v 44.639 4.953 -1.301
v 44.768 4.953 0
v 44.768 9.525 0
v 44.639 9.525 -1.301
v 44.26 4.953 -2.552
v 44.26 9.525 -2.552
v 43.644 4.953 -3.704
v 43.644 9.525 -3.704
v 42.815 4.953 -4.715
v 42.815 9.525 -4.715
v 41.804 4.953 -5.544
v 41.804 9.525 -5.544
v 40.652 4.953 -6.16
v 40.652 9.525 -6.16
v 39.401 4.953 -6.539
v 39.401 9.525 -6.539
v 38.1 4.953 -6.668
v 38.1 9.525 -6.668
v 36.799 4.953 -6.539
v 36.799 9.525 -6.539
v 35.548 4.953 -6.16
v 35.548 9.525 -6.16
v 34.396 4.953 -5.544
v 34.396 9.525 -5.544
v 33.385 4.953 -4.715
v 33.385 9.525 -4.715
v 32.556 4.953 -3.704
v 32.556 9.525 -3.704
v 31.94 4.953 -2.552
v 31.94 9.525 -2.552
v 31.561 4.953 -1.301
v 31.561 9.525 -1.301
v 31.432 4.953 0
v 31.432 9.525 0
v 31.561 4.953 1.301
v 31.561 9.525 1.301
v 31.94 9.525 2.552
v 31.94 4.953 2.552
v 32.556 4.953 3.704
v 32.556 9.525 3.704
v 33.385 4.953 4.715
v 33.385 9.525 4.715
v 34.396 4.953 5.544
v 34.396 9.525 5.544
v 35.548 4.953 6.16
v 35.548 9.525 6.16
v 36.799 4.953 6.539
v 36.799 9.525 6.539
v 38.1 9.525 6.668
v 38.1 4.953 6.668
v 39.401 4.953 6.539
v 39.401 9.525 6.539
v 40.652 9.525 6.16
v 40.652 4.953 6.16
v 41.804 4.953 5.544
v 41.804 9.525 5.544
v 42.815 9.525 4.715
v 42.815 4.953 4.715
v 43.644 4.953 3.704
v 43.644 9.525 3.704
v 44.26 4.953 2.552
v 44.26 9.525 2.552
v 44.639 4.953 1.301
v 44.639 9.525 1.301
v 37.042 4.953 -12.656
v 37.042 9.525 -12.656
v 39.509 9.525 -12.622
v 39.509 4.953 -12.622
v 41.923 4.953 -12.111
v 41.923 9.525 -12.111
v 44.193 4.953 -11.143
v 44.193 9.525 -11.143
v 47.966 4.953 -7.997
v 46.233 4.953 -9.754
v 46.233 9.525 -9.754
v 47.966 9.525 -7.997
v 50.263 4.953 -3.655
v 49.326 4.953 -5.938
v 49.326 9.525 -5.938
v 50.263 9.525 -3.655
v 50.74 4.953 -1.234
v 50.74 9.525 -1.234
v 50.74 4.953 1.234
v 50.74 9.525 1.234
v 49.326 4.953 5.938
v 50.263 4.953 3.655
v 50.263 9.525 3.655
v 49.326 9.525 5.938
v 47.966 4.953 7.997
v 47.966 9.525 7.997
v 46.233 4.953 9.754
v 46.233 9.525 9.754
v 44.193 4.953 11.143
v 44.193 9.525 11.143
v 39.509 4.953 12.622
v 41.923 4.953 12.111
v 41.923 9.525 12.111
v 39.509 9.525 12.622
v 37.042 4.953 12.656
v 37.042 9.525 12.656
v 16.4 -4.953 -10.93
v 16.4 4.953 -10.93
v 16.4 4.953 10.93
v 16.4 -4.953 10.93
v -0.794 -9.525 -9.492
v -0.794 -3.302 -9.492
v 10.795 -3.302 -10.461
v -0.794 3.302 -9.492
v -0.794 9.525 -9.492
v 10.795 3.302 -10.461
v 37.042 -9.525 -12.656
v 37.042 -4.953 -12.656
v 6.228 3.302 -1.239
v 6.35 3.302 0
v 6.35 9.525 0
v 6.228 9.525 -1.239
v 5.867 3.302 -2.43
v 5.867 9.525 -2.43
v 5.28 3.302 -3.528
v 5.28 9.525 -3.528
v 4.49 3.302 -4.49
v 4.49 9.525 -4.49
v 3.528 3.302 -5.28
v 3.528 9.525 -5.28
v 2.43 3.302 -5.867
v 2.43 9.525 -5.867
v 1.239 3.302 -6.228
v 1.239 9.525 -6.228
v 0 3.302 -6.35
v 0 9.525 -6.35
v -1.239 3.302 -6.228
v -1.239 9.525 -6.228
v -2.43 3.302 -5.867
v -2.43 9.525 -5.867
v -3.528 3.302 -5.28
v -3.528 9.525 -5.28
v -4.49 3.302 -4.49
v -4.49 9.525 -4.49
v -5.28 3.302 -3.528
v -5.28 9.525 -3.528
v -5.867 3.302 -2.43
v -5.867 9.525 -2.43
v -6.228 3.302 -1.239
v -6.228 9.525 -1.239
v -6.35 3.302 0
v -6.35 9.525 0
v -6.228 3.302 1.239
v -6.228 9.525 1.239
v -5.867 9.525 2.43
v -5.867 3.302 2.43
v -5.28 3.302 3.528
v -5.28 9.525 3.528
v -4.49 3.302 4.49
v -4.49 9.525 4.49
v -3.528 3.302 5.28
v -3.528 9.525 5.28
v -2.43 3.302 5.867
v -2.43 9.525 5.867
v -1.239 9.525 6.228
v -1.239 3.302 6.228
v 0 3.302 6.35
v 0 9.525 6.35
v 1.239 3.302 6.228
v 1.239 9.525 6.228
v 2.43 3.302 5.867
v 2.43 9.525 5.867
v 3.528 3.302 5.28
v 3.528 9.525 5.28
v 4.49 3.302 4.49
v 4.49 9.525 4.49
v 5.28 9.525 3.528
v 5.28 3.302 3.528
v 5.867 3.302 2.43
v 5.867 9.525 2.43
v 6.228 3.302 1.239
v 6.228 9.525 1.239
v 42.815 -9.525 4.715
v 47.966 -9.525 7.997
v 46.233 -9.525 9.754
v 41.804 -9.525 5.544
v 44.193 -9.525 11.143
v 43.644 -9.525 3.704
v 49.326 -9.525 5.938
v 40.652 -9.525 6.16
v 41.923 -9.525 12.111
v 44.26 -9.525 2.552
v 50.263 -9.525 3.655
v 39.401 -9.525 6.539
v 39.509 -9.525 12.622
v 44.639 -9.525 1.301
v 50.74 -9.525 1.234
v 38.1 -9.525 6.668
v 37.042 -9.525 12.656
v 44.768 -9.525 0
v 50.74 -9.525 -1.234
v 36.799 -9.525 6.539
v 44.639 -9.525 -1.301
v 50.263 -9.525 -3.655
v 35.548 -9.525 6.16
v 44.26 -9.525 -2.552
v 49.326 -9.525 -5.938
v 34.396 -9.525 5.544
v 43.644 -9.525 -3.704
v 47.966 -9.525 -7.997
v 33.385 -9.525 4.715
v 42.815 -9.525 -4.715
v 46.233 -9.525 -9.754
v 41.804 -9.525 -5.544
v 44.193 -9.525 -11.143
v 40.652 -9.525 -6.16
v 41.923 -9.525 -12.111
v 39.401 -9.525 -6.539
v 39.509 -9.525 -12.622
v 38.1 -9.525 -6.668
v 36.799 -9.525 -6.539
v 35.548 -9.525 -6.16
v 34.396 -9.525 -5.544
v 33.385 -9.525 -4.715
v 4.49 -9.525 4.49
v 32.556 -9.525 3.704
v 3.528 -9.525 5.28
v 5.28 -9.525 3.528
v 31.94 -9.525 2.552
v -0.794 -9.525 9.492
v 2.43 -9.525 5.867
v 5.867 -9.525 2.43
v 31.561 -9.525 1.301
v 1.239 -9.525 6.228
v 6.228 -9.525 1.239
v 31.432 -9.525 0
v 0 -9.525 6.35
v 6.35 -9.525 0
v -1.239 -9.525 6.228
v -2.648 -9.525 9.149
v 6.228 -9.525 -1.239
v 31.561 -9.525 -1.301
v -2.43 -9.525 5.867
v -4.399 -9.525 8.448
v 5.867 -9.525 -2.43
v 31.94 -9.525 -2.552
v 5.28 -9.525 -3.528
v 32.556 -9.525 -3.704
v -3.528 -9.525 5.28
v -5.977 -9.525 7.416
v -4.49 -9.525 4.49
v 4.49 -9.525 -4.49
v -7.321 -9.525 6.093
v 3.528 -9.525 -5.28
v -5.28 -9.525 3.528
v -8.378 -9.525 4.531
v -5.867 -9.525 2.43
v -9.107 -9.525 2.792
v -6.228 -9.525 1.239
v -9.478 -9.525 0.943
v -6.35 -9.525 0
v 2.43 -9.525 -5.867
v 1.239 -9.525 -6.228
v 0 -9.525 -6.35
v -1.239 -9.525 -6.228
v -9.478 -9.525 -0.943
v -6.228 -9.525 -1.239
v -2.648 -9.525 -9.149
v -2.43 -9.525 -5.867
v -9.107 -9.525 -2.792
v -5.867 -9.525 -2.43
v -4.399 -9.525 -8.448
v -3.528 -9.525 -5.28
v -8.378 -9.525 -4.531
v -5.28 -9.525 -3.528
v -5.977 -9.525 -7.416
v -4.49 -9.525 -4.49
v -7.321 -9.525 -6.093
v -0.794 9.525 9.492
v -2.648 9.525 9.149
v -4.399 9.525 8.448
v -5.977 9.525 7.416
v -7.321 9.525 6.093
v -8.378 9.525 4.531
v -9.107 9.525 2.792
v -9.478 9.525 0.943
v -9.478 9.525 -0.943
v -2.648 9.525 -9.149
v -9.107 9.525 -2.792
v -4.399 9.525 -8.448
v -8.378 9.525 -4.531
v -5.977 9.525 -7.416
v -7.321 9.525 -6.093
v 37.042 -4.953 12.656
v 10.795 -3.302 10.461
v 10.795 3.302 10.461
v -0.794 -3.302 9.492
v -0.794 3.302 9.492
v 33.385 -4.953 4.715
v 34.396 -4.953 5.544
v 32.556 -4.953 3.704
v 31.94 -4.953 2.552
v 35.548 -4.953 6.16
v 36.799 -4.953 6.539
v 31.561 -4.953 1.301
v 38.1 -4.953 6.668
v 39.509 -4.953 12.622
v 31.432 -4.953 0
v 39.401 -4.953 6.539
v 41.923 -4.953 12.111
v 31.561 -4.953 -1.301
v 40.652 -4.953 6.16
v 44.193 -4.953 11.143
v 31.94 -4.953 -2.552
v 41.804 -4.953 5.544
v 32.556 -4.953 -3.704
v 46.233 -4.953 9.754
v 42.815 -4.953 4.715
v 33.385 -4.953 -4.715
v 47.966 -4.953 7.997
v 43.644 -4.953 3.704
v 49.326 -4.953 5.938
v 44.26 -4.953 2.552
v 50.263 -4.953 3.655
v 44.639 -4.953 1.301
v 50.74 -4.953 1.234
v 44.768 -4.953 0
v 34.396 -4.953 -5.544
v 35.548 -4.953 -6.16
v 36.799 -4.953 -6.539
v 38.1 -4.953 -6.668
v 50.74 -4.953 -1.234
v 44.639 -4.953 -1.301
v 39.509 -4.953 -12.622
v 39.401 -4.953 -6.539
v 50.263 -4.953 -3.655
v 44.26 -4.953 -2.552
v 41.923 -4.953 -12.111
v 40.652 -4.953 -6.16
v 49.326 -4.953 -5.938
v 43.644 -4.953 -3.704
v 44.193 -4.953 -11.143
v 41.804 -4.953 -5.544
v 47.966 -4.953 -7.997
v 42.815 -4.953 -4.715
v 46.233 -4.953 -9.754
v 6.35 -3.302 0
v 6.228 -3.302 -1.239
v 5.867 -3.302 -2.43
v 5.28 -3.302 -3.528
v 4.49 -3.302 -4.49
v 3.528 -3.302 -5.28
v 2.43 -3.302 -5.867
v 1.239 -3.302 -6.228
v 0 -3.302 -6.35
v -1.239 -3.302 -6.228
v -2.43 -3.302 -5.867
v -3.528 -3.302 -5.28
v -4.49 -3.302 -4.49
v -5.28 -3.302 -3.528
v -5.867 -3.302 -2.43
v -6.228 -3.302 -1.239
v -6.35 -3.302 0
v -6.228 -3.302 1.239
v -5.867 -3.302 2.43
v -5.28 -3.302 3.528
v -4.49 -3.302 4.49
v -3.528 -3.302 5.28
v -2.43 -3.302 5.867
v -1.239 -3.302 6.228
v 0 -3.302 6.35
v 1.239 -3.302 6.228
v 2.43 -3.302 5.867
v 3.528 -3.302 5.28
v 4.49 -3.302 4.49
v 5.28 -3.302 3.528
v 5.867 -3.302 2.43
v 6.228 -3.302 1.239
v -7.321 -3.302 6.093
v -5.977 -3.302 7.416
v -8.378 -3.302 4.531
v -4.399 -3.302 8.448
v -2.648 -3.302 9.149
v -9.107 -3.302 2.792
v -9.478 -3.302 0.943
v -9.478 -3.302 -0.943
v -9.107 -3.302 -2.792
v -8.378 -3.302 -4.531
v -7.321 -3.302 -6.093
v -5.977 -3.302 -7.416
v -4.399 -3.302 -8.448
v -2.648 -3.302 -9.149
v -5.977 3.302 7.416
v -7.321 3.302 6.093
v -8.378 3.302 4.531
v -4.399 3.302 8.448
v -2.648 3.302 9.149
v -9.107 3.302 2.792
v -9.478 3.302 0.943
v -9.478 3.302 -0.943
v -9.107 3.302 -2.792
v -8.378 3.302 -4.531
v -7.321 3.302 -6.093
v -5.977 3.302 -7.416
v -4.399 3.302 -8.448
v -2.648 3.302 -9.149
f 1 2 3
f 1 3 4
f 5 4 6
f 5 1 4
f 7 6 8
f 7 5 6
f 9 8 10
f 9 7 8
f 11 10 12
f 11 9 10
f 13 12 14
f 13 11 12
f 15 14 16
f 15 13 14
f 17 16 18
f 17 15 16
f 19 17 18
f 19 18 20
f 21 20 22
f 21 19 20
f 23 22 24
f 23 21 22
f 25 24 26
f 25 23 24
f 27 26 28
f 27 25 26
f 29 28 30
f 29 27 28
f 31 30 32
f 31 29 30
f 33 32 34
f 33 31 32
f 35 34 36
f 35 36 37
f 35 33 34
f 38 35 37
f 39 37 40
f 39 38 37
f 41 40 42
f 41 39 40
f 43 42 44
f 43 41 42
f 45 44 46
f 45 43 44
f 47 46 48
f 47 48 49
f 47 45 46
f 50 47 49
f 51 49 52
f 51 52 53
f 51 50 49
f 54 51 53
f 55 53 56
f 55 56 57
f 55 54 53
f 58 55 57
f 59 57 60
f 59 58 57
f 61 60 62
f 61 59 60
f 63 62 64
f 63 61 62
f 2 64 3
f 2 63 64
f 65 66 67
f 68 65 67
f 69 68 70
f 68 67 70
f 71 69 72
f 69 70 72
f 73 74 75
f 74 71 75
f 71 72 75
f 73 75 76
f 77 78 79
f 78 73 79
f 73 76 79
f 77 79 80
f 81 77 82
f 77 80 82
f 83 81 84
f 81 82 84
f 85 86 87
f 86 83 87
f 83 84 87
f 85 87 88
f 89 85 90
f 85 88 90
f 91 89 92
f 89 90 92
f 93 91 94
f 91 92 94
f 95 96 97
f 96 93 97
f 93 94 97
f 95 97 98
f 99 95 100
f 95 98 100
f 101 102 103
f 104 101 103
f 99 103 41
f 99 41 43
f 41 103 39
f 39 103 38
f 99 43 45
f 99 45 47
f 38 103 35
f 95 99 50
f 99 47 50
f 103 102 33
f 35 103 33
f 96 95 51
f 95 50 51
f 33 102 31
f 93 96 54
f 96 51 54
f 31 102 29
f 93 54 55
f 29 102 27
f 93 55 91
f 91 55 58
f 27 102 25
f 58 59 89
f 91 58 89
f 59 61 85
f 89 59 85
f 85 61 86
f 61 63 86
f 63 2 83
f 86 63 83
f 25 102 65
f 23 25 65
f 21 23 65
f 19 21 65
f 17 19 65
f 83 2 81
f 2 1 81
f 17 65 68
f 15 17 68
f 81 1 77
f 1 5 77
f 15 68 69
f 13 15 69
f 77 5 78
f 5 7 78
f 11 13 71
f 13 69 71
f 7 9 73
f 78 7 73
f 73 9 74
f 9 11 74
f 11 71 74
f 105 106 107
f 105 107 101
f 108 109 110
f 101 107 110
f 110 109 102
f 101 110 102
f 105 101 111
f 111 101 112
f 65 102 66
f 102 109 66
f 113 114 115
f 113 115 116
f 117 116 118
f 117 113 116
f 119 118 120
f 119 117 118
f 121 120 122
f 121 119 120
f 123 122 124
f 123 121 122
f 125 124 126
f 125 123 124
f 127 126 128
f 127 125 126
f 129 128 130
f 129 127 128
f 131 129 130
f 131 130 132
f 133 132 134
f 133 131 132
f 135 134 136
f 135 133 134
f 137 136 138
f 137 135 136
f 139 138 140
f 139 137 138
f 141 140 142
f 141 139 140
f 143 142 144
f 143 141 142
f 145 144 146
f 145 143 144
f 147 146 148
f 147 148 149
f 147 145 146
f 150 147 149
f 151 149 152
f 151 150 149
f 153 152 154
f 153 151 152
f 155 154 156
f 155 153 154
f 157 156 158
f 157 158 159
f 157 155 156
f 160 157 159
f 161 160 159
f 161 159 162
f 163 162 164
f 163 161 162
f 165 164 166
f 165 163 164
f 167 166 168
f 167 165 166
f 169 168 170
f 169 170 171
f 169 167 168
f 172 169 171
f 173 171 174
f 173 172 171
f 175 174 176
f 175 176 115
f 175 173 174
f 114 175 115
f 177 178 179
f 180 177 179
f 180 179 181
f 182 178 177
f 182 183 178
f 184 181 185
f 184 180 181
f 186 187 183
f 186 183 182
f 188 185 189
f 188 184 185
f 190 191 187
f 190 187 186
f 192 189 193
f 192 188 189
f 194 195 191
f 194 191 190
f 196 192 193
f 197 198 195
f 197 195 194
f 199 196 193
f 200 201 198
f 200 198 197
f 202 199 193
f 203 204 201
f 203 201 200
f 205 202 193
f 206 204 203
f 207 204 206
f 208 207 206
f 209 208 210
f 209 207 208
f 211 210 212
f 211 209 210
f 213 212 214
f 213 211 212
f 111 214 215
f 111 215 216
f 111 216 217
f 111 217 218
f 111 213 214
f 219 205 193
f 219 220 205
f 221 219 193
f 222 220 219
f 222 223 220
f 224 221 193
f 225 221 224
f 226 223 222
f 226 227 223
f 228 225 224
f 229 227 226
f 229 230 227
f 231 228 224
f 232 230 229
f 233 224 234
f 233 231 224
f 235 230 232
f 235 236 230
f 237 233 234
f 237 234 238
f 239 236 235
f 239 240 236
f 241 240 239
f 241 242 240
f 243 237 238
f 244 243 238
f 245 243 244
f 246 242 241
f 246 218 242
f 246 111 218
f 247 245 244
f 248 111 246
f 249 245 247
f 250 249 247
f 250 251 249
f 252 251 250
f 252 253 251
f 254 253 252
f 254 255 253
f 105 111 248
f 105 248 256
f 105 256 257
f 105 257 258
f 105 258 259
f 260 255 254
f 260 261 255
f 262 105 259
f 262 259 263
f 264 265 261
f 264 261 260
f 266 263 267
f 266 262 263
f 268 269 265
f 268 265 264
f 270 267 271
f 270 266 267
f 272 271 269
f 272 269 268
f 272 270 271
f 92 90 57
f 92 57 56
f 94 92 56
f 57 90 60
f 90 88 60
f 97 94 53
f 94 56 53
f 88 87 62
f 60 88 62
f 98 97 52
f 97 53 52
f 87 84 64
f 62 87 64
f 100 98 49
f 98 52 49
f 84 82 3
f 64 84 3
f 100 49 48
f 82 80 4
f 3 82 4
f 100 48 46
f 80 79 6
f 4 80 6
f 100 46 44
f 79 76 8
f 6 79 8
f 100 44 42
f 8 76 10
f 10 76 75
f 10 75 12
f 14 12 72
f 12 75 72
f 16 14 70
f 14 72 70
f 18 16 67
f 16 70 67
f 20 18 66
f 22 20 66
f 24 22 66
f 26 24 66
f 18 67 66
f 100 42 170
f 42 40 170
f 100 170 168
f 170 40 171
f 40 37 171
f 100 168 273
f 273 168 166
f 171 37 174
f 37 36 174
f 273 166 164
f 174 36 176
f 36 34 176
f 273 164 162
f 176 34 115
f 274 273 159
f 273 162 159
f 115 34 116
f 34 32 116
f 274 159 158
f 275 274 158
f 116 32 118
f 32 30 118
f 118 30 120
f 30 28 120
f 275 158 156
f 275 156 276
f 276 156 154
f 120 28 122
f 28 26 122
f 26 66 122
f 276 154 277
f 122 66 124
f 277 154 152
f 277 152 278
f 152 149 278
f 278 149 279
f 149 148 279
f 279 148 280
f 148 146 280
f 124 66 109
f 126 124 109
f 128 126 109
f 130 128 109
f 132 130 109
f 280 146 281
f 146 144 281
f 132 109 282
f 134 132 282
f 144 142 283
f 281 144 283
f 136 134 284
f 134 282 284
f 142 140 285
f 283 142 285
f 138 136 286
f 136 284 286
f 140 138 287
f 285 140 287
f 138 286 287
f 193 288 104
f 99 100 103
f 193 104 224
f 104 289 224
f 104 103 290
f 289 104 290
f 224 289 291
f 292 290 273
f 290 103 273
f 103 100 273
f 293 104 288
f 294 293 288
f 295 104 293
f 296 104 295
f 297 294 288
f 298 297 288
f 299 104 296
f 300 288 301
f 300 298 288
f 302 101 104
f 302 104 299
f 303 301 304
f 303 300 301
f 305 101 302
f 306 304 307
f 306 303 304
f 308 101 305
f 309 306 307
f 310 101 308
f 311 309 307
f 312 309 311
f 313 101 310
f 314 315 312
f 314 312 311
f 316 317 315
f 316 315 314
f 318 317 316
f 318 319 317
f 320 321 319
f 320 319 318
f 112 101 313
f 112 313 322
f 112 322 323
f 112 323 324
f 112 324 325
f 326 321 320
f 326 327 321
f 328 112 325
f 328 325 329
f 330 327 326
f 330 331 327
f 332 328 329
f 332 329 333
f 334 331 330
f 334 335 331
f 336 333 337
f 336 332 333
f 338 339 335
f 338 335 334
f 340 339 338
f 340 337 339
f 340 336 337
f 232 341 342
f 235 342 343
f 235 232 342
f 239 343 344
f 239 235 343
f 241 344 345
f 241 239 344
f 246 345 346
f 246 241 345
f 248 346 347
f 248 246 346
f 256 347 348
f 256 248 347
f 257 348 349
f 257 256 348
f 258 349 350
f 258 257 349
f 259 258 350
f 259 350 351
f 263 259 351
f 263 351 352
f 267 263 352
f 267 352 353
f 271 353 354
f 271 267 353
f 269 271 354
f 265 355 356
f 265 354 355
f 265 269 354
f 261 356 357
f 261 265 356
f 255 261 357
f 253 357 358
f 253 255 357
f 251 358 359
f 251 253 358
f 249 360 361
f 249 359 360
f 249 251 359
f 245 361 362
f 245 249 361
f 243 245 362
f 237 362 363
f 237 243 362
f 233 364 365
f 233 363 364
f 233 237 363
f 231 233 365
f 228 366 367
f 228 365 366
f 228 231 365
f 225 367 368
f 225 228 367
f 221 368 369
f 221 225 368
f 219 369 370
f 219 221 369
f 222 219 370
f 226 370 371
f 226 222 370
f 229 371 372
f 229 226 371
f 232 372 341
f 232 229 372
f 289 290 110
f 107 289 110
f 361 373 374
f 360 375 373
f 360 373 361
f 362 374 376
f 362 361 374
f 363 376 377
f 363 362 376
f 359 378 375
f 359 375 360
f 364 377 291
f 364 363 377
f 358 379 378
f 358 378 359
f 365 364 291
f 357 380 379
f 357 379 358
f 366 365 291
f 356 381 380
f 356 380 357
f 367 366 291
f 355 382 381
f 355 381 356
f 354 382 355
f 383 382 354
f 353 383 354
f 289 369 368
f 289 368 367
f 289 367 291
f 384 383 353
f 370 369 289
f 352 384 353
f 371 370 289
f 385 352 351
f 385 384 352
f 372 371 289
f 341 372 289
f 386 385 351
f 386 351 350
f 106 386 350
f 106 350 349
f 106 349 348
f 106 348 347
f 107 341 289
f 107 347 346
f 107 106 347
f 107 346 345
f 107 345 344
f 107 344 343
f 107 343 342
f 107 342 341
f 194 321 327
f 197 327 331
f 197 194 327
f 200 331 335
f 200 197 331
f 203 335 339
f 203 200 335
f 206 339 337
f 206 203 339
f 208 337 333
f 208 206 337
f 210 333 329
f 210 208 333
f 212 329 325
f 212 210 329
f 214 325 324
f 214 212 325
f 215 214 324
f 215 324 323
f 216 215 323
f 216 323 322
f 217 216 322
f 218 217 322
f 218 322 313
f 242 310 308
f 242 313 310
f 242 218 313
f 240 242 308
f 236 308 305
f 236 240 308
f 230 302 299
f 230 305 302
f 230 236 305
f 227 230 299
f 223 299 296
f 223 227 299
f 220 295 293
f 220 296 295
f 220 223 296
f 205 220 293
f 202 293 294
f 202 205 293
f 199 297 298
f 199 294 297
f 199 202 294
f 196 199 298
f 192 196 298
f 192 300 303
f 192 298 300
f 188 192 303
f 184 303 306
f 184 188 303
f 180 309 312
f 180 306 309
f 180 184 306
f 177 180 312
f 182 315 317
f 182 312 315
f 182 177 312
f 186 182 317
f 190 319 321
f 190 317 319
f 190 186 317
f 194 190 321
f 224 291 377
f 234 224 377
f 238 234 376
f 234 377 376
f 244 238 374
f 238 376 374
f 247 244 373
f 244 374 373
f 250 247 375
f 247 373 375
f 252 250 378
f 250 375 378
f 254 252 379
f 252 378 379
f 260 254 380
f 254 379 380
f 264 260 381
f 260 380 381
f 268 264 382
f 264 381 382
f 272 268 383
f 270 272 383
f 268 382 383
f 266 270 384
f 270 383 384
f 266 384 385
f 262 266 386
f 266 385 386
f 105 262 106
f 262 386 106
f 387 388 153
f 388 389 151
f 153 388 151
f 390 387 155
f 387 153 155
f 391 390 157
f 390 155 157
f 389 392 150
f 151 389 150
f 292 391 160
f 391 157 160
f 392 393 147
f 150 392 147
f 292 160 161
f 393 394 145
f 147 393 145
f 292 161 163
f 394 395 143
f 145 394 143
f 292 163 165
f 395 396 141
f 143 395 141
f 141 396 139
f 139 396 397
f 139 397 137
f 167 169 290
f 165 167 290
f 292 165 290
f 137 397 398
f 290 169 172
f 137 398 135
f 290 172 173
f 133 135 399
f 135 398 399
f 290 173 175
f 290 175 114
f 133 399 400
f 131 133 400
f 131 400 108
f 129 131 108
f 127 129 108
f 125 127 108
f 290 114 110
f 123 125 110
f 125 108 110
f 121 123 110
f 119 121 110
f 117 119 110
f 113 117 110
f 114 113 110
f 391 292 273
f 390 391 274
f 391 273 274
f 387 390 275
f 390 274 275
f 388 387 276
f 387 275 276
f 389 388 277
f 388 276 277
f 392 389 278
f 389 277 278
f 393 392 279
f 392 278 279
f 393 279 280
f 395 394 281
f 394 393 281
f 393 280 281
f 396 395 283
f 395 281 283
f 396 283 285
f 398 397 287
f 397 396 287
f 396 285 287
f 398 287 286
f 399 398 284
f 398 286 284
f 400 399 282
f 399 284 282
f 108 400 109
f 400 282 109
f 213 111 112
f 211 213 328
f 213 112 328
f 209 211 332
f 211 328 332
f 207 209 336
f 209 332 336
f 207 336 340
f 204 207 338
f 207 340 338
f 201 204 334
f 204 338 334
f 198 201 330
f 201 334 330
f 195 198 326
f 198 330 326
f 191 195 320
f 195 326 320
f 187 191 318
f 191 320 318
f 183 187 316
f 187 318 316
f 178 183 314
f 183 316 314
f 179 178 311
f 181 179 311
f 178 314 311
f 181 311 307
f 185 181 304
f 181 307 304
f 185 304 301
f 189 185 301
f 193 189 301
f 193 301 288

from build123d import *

# Parameters (mm, degrees)
SKETCH1_R           = 6.35
SKETCH1_R_2         = 6.6675
BOSS_EXTRUDE1_DEPTH = 9.525
SKETCH2_W           = 21.59
SKETCH2_H           = 20.921938848
CUT_EXTRUDE1_DEPTH  = 3.302
CUT_EXTRUDE2_DEPTH  = 4.953


with BuildPart() as part:
    # Sketch1 → Boss-Extrude1 (new, symmetric)
    with BuildSketch(Plane(origin=(0, 0, 0), x_dir=(1, 0, 0), z_dir=(0, 1, 0))):
        with BuildLine():
            Line((-0.79375, 9.491869465), (37.041666667, 12.655825953))
            ThreePointArc((37.041666667, 12.655825953), (50.8, 0), (37.041666667, -12.655825953))
            Line((37.041666667, -12.655825953), (-0.79375, -9.491869465))
            ThreePointArc((-0.79375, -9.491869465), (-9.525, 0), (-0.79375, 9.491869465))
        make_face()
        Circle(SKETCH1_R, mode=Mode.SUBTRACT)
        with Locations((38.1, 0)):
            Circle(SKETCH1_R_2, mode=Mode.SUBTRACT)
    extrude(amount=BOSS_EXTRUDE1_DEPTH, both=True)

    # Sketch2 → Cut-Extrude1 (cut, symmetric)
    with BuildSketch(Plane(origin=(0, 0, 0), x_dir=(1, 0, 0), z_dir=(0, 1, 0))):
        Rectangle(SKETCH2_W, SKETCH2_H)
    extrude(amount=CUT_EXTRUDE1_DEPTH, both=True, mode=Mode.SUBTRACT)

    # Sketch3 → Cut-Extrude2 (cut, symmetric)
    with BuildSketch(Plane(origin=(0, 0, 0), x_dir=(1, 0, 0), z_dir=(0, 1, 0))):
        with BuildLine():
            Line((37.041666667, 12.655825953), (16.4, 10.929683071))
            Line((16.4, 10.929683071), (16.4, -10.929683071))
            Line((16.4, -10.929683071), (37.041666667, -12.655825953))
            ThreePointArc((37.041666667, -12.655825953), (50.8, 0), (37.041666667, 12.655825953))
        make_face()
    extrude(amount=CUT_EXTRUDE2_DEPTH, both=True, mode=Mode.SUBTRACT)


solid = part.part
